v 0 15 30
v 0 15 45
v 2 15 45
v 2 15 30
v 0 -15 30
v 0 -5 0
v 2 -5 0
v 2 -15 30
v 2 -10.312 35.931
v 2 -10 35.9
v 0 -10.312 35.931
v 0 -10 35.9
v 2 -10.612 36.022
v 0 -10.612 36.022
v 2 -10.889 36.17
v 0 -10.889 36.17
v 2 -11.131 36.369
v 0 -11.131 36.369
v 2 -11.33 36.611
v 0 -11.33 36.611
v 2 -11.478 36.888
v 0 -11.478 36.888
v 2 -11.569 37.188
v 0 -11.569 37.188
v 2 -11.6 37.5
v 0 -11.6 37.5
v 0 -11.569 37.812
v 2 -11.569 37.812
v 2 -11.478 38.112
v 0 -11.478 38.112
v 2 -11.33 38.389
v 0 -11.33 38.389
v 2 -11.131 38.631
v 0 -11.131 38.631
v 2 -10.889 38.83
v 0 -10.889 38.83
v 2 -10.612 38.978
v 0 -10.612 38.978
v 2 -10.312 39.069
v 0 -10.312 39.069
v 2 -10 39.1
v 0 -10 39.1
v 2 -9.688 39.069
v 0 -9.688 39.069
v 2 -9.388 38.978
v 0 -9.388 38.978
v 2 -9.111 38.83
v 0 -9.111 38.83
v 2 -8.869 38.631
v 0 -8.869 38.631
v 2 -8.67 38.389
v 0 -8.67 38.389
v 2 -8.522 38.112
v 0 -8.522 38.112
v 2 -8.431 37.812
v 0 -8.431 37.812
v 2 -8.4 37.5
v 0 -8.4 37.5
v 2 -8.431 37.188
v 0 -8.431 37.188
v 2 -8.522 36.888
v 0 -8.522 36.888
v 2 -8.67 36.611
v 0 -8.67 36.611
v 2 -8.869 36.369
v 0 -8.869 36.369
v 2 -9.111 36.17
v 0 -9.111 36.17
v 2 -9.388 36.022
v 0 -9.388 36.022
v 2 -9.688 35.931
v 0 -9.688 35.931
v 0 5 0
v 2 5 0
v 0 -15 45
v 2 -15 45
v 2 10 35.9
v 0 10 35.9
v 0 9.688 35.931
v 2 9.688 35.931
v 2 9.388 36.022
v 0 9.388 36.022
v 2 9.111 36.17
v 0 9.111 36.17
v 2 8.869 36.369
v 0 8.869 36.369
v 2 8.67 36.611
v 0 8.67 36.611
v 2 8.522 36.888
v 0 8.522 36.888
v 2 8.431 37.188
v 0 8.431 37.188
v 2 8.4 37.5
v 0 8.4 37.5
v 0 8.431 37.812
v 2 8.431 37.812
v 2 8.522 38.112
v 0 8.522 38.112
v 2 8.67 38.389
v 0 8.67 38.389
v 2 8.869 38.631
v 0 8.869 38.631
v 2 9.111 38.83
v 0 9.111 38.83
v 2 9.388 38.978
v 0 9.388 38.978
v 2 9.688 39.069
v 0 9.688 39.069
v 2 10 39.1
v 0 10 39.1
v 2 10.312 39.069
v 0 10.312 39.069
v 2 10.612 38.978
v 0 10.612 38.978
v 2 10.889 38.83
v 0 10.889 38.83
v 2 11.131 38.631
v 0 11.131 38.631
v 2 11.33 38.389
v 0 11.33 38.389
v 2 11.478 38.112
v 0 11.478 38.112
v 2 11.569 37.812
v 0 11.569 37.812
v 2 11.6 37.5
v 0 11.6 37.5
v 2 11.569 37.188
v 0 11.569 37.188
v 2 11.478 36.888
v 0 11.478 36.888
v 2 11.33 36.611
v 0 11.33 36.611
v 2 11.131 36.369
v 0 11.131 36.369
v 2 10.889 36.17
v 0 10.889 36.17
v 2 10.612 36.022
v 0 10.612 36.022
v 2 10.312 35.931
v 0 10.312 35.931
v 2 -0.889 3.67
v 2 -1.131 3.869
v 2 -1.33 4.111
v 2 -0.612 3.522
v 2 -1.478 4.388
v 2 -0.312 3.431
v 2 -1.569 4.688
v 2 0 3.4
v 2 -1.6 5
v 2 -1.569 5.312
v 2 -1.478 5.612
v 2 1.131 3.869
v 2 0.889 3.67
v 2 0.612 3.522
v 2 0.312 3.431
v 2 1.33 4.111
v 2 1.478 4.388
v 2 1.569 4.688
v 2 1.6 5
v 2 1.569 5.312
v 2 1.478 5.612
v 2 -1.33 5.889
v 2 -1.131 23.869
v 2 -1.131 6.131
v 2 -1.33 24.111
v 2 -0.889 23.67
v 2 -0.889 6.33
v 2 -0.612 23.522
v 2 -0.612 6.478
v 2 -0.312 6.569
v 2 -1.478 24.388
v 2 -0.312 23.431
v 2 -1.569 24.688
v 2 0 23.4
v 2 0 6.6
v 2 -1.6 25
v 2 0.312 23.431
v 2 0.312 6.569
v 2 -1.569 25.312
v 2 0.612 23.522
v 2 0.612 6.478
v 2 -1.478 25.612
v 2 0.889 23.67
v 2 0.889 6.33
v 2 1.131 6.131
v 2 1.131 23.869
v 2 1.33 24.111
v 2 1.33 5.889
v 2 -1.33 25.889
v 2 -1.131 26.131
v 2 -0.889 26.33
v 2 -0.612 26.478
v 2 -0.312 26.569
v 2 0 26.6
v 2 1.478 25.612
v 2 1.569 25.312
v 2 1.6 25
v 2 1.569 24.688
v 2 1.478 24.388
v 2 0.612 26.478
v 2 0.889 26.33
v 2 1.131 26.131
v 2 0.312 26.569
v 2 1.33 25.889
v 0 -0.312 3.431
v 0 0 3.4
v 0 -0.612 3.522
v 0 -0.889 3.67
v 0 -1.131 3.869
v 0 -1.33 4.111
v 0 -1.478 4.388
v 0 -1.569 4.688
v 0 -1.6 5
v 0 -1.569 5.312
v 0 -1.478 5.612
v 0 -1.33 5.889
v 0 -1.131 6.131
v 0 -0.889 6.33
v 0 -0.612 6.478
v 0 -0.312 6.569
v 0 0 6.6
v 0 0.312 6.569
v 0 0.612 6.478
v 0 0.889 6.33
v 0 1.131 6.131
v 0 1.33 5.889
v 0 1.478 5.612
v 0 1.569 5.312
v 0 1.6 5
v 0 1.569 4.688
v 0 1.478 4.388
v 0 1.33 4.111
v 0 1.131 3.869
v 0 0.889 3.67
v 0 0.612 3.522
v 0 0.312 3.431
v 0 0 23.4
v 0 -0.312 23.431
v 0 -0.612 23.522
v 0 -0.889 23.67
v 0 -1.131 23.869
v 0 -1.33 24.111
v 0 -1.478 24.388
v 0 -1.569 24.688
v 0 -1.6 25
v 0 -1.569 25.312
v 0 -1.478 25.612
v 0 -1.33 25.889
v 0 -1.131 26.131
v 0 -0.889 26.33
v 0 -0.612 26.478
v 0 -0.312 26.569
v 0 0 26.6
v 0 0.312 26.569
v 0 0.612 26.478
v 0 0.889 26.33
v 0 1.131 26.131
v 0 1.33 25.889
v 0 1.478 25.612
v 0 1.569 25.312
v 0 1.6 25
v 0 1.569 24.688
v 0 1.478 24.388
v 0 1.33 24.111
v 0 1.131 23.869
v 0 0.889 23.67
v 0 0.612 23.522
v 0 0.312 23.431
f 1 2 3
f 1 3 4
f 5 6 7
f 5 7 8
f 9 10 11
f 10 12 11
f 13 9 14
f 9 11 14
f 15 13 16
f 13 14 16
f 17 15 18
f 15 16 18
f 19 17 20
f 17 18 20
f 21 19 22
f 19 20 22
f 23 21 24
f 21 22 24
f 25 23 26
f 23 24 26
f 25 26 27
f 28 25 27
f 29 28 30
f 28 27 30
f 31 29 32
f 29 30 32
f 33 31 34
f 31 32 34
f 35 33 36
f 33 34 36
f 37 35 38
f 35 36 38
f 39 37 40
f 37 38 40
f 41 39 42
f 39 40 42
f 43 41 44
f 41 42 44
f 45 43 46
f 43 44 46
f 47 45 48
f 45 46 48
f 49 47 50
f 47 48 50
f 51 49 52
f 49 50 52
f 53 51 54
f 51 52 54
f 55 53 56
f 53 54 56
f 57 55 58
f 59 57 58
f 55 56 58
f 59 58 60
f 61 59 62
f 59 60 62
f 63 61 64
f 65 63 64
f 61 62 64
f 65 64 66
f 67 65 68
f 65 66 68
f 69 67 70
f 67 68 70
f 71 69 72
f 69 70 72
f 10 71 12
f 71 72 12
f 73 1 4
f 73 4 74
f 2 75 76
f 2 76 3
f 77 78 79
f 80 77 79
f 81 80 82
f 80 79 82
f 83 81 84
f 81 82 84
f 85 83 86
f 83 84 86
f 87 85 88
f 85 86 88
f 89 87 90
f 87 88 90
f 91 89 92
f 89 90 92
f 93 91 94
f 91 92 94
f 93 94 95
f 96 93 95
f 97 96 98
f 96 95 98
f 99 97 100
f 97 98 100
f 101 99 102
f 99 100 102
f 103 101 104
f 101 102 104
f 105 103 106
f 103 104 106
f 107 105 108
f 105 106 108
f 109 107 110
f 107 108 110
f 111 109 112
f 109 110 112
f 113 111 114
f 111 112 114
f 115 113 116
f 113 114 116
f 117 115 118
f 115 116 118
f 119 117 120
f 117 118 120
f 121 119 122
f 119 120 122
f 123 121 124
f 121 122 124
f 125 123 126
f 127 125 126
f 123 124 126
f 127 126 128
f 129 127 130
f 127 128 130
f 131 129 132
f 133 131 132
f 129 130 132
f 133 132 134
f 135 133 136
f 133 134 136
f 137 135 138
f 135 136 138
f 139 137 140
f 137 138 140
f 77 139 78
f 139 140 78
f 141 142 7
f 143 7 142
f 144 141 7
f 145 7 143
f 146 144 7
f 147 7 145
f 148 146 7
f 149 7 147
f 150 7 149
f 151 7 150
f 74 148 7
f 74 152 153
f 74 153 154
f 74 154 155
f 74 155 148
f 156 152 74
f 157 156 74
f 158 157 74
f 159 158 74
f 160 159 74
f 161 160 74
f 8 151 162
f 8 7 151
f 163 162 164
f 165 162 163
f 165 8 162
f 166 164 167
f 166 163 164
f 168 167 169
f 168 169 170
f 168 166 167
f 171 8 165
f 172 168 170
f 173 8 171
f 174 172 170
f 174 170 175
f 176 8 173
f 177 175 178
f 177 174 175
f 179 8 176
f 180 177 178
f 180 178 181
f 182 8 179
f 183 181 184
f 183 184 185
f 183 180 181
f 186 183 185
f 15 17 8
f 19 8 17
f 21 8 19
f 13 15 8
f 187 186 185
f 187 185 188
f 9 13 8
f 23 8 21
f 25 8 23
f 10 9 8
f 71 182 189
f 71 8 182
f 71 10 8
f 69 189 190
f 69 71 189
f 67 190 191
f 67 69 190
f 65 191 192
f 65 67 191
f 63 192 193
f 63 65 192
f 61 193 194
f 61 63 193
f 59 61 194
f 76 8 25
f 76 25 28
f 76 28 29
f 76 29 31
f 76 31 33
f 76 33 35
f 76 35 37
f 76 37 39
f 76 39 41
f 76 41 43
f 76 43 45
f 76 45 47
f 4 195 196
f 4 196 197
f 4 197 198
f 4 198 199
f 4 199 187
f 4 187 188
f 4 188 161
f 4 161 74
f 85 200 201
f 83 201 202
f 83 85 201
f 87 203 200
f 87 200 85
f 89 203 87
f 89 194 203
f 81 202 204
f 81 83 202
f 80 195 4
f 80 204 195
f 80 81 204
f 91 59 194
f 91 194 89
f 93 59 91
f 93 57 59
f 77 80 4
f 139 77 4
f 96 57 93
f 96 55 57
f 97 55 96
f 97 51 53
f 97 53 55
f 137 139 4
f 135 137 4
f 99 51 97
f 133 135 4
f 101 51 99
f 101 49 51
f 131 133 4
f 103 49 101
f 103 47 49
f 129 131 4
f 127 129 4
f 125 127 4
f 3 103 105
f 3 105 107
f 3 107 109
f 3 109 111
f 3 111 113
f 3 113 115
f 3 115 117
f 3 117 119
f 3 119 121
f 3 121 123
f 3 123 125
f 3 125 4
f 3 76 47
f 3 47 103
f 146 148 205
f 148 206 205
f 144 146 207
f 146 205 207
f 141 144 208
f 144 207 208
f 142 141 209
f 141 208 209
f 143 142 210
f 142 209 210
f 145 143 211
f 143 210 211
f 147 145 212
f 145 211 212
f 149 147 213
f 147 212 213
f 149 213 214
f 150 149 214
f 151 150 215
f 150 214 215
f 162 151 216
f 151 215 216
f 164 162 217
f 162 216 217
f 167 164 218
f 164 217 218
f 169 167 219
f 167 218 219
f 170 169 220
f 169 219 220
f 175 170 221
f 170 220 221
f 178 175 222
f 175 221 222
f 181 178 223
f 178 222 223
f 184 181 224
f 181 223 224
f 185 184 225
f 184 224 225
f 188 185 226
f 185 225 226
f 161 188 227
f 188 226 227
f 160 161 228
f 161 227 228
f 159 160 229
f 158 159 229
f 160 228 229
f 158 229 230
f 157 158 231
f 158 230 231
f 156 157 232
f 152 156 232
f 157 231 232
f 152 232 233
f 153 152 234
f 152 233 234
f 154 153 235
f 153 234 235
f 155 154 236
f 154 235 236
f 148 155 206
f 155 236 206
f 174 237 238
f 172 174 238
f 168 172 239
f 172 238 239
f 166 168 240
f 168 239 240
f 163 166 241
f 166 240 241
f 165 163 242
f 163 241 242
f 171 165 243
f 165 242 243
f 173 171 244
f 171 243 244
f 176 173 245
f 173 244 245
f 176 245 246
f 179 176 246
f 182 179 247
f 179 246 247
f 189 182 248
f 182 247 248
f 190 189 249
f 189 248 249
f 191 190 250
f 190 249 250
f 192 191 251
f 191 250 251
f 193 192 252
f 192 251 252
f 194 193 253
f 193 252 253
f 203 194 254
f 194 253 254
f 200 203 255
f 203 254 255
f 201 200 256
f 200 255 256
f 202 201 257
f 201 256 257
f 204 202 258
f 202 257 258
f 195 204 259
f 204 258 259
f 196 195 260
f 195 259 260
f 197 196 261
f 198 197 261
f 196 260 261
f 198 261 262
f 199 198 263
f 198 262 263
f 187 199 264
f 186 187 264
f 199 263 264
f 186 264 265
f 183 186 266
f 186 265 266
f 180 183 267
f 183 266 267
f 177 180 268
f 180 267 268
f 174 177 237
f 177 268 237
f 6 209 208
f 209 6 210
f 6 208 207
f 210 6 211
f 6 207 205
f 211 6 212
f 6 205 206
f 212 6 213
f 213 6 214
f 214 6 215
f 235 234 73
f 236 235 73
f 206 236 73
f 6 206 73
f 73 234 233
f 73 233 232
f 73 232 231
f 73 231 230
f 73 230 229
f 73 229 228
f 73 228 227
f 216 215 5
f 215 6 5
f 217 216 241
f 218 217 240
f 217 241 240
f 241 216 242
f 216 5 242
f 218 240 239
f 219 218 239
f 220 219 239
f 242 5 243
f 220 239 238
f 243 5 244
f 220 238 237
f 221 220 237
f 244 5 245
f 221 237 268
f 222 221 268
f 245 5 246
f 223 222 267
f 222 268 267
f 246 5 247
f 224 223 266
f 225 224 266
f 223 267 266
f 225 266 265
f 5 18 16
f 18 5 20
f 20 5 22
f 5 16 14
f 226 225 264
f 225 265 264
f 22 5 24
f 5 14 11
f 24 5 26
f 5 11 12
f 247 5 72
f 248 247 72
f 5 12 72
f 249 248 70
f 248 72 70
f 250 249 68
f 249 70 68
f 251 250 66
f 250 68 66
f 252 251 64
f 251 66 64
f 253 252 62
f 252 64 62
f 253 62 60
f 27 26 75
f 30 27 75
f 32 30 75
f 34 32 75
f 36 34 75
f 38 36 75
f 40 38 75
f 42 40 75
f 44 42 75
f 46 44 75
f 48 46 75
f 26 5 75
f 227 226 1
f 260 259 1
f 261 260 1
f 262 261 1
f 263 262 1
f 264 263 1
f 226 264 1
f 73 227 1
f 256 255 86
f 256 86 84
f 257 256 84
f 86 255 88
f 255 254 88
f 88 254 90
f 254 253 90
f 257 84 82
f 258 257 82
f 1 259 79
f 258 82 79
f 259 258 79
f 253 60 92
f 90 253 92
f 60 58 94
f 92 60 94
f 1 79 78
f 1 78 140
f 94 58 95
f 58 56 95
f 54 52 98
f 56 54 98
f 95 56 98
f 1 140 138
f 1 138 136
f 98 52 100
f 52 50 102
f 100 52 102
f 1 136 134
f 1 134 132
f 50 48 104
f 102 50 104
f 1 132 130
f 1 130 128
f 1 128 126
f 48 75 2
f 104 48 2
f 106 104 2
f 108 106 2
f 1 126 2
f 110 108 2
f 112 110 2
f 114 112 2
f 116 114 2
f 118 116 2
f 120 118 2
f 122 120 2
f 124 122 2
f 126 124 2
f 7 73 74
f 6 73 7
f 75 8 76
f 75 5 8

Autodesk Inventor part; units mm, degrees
ref_plane "YZ Plane" through (0, 0, 0) normal (1, 0, 0) x (0, 1, 0)
ref_plane "XZ Plane" through (0, 0, 0) normal (0, 1, 0) x (-1, 0, 0)
ref_plane "XY Plane" through (0, 0, 0) normal (0, 0, 1) x (1, 0, 0)
sketch "スケッチ1" plane through (0, 0, 0) normal (1, 0, 0) x (0, 1, 0)
  line L0 (-5, 30) -> (5, 30)
  line L1 (5, 30) -> (5, 0)
  line L2 (5, 0) -> (-5, 0)
  line L3 (-5, 0) -> (-5, 30)
  line L4 (-15, 45) -> (15, 45)
  line L5 (15, 45) -> (15, 30)
  line L6 (15, 30) -> (-15, 30)
  line L7 (-15, 30) -> (-15, 45)
  line L8 (15, 30) -> (5, 0)
  line L9 (-5, 0) -> (-15, 30)
  point P0 (0, 0)
  point P1 (0, 0)
  point P2 (0, 30)
  dimension "d0" = 10
  dimension "d1" = 30
  dimension "d2" = 30
  dimension "d3" = 15
extrude "押し出し1" add sketch "スケッチ1" along normal blind 2
sketch "スケッチ2" plane through (2, 0, 0) normal (1, 0, 0) x (0, 0, -1)
  line L0 (0, -5) -> (0, 5) projected
  line L1 (-30, 15) -> (-45, 15) projected
  line L2 (-45, -15) -> (-30, -15) projected
  point P0 (0, 0)
  point P1 (-37.5, 10)
  point P2 (-37.5, -10)
  point P3 (-25, 0)
  point P4 (-5, 0)
  point P5 (0, 0)
  point P6 (-37.5, 15)
  dimension "d6" = 5
  dimension "d7" = 20
  dimension "d8" = 5
  dimension "d9" = 5
hole "穴1" at (2, 10, 37.5) at (2, -10, 37.5) at (2, 0, 25) at (2, 0, 5) direction (-1, 0, 0) diameter 3.2 end through all
properties part number "FrameJointT1510" material "アルミニウム 6061"
